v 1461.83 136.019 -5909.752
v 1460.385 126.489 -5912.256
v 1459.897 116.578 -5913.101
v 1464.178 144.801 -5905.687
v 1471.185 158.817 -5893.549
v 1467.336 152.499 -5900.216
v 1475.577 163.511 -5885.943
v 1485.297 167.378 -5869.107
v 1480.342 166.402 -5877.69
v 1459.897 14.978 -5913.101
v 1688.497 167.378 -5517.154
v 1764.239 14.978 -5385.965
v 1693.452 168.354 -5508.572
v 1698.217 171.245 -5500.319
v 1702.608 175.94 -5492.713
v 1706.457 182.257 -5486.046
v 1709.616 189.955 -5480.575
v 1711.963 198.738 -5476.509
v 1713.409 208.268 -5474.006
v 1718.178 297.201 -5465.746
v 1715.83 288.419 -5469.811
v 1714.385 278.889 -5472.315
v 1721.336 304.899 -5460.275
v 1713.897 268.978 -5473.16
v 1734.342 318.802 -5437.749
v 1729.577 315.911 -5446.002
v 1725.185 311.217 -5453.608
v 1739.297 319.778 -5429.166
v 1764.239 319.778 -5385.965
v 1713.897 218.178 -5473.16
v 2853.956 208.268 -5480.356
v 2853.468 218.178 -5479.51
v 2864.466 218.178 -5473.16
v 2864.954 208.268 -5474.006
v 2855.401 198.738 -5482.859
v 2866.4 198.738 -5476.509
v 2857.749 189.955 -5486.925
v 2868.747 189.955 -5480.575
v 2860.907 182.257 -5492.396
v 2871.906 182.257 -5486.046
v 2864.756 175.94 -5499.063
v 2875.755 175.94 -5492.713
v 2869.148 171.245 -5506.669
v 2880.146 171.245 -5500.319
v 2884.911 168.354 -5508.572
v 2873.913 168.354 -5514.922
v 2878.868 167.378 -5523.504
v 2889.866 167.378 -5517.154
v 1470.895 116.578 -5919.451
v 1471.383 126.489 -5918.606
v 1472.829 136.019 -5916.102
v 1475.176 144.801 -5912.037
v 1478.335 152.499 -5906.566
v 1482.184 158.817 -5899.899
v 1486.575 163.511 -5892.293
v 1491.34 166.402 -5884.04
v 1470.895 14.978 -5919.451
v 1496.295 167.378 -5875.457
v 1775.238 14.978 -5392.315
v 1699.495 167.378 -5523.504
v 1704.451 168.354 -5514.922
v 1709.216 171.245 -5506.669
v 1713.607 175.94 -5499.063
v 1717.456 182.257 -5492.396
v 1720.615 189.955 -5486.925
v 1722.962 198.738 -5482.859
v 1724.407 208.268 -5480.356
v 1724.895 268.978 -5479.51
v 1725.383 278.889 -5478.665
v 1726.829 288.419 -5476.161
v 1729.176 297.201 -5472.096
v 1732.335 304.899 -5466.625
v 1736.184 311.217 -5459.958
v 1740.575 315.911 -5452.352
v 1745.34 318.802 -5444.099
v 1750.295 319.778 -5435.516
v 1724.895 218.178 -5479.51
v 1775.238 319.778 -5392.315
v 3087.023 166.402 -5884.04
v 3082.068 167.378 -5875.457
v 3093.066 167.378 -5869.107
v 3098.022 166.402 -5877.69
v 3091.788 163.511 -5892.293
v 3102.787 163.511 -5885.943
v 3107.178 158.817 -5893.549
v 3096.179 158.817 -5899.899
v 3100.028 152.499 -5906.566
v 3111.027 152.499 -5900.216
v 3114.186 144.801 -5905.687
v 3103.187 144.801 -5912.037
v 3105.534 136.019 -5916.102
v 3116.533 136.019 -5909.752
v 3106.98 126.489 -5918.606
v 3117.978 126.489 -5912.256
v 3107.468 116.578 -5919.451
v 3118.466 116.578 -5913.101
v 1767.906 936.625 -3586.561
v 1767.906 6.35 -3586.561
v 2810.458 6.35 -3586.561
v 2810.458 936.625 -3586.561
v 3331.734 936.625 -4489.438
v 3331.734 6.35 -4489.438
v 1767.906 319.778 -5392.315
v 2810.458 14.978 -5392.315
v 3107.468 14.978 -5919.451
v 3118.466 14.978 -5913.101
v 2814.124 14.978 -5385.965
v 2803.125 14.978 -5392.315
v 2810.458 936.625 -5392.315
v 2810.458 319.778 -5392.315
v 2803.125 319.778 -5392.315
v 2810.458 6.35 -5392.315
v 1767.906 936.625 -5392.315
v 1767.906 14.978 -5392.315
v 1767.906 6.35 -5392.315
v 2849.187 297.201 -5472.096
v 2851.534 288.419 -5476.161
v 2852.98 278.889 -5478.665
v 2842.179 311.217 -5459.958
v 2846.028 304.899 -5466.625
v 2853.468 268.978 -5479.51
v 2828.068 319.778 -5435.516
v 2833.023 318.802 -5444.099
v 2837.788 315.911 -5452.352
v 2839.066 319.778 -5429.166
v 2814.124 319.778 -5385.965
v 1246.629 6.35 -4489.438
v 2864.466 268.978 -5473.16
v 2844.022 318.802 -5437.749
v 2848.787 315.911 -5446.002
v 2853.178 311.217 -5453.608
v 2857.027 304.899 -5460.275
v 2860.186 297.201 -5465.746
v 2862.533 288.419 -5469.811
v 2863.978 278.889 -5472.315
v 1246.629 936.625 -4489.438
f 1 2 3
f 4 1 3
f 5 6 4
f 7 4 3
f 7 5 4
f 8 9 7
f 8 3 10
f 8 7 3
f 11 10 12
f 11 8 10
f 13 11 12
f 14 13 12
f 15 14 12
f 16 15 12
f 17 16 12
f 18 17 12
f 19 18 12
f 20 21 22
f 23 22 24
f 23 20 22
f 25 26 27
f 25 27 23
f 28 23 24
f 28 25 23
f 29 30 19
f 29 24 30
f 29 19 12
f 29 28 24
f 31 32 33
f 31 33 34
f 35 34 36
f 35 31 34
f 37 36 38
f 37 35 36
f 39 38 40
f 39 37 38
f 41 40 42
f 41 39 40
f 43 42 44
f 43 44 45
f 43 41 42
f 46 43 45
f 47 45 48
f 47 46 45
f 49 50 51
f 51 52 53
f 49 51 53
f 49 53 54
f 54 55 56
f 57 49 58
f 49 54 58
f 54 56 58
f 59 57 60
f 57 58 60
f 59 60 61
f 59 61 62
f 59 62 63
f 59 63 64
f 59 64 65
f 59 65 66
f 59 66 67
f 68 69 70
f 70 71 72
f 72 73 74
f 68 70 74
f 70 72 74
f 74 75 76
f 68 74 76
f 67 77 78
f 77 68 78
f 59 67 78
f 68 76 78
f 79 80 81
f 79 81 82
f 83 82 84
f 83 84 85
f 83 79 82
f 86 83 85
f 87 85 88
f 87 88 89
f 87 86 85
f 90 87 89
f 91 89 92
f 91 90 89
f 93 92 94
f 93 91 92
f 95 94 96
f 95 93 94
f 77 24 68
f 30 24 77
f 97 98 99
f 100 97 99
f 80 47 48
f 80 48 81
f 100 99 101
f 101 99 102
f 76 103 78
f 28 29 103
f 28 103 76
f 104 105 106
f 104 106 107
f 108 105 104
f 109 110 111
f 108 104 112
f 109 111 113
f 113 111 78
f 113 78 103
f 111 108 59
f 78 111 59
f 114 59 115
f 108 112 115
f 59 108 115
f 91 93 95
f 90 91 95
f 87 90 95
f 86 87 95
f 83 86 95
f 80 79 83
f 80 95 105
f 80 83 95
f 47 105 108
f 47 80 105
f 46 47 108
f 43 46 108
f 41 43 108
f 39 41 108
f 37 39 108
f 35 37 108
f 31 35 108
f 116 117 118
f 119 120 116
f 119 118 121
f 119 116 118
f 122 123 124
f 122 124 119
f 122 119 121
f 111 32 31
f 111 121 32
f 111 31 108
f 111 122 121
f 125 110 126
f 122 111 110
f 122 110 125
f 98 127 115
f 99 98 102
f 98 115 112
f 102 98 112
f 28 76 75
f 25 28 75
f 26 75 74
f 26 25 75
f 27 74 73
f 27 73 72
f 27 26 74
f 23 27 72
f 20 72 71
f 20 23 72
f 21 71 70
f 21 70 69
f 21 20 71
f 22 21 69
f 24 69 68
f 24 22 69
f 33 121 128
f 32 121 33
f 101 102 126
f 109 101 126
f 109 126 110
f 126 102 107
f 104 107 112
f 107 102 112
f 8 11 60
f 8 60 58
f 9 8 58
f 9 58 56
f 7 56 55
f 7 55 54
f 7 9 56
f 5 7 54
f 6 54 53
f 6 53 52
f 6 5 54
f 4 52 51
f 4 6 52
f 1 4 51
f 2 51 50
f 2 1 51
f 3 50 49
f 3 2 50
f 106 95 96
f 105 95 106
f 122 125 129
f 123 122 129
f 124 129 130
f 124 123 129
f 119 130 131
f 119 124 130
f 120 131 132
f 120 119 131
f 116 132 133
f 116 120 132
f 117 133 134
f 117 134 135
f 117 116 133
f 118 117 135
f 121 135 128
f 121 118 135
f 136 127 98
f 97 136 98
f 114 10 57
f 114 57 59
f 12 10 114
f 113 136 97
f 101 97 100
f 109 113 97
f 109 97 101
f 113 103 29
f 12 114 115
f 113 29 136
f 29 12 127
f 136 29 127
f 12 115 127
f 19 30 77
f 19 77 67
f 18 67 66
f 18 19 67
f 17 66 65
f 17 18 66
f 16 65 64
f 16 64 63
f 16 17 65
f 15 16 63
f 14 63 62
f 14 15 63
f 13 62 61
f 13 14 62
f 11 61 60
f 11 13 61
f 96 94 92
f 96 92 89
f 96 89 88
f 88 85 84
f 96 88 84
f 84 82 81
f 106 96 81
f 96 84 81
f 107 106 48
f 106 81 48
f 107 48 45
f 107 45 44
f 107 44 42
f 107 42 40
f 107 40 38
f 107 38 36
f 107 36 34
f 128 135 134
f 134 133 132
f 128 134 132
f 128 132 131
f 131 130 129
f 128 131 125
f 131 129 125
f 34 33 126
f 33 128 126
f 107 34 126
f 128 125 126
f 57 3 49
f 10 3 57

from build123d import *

# Parameters (mm, degrees)
BOSS_EXTRUDE1_DEPTH = 930.275
BOSS_EXTRUDE2_DEPTH = 12.7
BOSS_EXTRUDE3_DEPTH = 12.7


with BuildPart() as part:
    # Sketch1 → Boss-Extrude1 (new body)
    with BuildSketch(Plane(origin=(0, 6.35, 0), x_dir=(1, 0, 0), z_dir=(0, 1, 0))):
        Polygon((1767.90556734, 3586.561176343), (2810.457786806, 3586.561176343), (3331.733896538, 4489.437883172), (2810.457786805, 5392.314590001), (1767.90556734, 5392.314590001), (1246.629457607, 4489.437883172), align=None)
    extrude(amount=BOSS_EXTRUDE1_DEPTH)

    # Sketch2 → Boss-Extrude2 (add)
    with BuildSketch(Plane(origin=(-232.596631279, 0, -134.289727682), x_dir=(-0.500000000000017, 0, 0.8660254037844288), z_dir=(-0.8660254037844288, 0, -0.500000000000017))):
        with BuildLine():
            Line((-6222.929094075, 167.37838), (-6629.329094075, 167.37838))
            ThreePointArc((-6629.329094075, 167.37838), (-6665.250118559, 152.499404484), (-6680.129094075, 116.57838))
            Line((-6680.129094075, 116.57838), (-6680.129094075, 14.97838))
            Line((-6680.129094075, 14.97838), (-6070.529094075, 14.97838))
            Line((-6070.529094075, 14.97838), (-6070.529094075, 319.77838))
            Line((-6070.529094075, 319.77838), (-6121.329094075, 319.77838))
            ThreePointArc((-6121.329094075, 319.77838), (-6157.250118559, 304.899404484), (-6172.129094075, 268.97838))
            Line((-6172.129094075, 268.97838), (-6172.129094075, 218.17838))
            ThreePointArc((-6172.129094075, 218.17838), (-6187.008069591, 182.257355516), (-6222.929094075, 167.37838))
        make_face()
    extrude(amount=-BOSS_EXTRUDE2_DEPTH)

    # Sketch3 → Boss-Extrude3 (add)
    with BuildSketch(Plane(origin=(3655.37062426, 0, -2110.429213904), x_dir=(0.500000000000017, 0, 0.8660254037844288), z_dir=(-0.8660254037844288, 0, 0.500000000000017))):
        with BuildLine():
            Line((-3933.747417002, 167.37838), (-4340.147417002, 167.37838))
            ThreePointArc((-4340.147417002, 167.37838), (-4376.068441487, 152.499404484), (-4390.947417002, 116.57838))
            Line((-4390.947417002, 116.57838), (-4390.947417002, 14.97838))
            Line((-4390.947417002, 14.97838), (-3781.347417002, 14.97838))
            Line((-3781.347417002, 14.97838), (-3781.347417002, 319.77838))
            Line((-3781.347417002, 319.77838), (-3832.147417002, 319.77838))
            ThreePointArc((-3832.147417002, 319.77838), (-3868.068441487, 304.899404484), (-3882.947417002, 268.97838))
            Line((-3882.947417002, 268.97838), (-3882.947417002, 218.17838))
            ThreePointArc((-3882.947417002, 218.17838), (-3897.826392518, 182.257355516), (-3933.747417002, 167.37838))
        make_face()
    extrude(amount=-BOSS_EXTRUDE3_DEPTH)


solid = part.part
